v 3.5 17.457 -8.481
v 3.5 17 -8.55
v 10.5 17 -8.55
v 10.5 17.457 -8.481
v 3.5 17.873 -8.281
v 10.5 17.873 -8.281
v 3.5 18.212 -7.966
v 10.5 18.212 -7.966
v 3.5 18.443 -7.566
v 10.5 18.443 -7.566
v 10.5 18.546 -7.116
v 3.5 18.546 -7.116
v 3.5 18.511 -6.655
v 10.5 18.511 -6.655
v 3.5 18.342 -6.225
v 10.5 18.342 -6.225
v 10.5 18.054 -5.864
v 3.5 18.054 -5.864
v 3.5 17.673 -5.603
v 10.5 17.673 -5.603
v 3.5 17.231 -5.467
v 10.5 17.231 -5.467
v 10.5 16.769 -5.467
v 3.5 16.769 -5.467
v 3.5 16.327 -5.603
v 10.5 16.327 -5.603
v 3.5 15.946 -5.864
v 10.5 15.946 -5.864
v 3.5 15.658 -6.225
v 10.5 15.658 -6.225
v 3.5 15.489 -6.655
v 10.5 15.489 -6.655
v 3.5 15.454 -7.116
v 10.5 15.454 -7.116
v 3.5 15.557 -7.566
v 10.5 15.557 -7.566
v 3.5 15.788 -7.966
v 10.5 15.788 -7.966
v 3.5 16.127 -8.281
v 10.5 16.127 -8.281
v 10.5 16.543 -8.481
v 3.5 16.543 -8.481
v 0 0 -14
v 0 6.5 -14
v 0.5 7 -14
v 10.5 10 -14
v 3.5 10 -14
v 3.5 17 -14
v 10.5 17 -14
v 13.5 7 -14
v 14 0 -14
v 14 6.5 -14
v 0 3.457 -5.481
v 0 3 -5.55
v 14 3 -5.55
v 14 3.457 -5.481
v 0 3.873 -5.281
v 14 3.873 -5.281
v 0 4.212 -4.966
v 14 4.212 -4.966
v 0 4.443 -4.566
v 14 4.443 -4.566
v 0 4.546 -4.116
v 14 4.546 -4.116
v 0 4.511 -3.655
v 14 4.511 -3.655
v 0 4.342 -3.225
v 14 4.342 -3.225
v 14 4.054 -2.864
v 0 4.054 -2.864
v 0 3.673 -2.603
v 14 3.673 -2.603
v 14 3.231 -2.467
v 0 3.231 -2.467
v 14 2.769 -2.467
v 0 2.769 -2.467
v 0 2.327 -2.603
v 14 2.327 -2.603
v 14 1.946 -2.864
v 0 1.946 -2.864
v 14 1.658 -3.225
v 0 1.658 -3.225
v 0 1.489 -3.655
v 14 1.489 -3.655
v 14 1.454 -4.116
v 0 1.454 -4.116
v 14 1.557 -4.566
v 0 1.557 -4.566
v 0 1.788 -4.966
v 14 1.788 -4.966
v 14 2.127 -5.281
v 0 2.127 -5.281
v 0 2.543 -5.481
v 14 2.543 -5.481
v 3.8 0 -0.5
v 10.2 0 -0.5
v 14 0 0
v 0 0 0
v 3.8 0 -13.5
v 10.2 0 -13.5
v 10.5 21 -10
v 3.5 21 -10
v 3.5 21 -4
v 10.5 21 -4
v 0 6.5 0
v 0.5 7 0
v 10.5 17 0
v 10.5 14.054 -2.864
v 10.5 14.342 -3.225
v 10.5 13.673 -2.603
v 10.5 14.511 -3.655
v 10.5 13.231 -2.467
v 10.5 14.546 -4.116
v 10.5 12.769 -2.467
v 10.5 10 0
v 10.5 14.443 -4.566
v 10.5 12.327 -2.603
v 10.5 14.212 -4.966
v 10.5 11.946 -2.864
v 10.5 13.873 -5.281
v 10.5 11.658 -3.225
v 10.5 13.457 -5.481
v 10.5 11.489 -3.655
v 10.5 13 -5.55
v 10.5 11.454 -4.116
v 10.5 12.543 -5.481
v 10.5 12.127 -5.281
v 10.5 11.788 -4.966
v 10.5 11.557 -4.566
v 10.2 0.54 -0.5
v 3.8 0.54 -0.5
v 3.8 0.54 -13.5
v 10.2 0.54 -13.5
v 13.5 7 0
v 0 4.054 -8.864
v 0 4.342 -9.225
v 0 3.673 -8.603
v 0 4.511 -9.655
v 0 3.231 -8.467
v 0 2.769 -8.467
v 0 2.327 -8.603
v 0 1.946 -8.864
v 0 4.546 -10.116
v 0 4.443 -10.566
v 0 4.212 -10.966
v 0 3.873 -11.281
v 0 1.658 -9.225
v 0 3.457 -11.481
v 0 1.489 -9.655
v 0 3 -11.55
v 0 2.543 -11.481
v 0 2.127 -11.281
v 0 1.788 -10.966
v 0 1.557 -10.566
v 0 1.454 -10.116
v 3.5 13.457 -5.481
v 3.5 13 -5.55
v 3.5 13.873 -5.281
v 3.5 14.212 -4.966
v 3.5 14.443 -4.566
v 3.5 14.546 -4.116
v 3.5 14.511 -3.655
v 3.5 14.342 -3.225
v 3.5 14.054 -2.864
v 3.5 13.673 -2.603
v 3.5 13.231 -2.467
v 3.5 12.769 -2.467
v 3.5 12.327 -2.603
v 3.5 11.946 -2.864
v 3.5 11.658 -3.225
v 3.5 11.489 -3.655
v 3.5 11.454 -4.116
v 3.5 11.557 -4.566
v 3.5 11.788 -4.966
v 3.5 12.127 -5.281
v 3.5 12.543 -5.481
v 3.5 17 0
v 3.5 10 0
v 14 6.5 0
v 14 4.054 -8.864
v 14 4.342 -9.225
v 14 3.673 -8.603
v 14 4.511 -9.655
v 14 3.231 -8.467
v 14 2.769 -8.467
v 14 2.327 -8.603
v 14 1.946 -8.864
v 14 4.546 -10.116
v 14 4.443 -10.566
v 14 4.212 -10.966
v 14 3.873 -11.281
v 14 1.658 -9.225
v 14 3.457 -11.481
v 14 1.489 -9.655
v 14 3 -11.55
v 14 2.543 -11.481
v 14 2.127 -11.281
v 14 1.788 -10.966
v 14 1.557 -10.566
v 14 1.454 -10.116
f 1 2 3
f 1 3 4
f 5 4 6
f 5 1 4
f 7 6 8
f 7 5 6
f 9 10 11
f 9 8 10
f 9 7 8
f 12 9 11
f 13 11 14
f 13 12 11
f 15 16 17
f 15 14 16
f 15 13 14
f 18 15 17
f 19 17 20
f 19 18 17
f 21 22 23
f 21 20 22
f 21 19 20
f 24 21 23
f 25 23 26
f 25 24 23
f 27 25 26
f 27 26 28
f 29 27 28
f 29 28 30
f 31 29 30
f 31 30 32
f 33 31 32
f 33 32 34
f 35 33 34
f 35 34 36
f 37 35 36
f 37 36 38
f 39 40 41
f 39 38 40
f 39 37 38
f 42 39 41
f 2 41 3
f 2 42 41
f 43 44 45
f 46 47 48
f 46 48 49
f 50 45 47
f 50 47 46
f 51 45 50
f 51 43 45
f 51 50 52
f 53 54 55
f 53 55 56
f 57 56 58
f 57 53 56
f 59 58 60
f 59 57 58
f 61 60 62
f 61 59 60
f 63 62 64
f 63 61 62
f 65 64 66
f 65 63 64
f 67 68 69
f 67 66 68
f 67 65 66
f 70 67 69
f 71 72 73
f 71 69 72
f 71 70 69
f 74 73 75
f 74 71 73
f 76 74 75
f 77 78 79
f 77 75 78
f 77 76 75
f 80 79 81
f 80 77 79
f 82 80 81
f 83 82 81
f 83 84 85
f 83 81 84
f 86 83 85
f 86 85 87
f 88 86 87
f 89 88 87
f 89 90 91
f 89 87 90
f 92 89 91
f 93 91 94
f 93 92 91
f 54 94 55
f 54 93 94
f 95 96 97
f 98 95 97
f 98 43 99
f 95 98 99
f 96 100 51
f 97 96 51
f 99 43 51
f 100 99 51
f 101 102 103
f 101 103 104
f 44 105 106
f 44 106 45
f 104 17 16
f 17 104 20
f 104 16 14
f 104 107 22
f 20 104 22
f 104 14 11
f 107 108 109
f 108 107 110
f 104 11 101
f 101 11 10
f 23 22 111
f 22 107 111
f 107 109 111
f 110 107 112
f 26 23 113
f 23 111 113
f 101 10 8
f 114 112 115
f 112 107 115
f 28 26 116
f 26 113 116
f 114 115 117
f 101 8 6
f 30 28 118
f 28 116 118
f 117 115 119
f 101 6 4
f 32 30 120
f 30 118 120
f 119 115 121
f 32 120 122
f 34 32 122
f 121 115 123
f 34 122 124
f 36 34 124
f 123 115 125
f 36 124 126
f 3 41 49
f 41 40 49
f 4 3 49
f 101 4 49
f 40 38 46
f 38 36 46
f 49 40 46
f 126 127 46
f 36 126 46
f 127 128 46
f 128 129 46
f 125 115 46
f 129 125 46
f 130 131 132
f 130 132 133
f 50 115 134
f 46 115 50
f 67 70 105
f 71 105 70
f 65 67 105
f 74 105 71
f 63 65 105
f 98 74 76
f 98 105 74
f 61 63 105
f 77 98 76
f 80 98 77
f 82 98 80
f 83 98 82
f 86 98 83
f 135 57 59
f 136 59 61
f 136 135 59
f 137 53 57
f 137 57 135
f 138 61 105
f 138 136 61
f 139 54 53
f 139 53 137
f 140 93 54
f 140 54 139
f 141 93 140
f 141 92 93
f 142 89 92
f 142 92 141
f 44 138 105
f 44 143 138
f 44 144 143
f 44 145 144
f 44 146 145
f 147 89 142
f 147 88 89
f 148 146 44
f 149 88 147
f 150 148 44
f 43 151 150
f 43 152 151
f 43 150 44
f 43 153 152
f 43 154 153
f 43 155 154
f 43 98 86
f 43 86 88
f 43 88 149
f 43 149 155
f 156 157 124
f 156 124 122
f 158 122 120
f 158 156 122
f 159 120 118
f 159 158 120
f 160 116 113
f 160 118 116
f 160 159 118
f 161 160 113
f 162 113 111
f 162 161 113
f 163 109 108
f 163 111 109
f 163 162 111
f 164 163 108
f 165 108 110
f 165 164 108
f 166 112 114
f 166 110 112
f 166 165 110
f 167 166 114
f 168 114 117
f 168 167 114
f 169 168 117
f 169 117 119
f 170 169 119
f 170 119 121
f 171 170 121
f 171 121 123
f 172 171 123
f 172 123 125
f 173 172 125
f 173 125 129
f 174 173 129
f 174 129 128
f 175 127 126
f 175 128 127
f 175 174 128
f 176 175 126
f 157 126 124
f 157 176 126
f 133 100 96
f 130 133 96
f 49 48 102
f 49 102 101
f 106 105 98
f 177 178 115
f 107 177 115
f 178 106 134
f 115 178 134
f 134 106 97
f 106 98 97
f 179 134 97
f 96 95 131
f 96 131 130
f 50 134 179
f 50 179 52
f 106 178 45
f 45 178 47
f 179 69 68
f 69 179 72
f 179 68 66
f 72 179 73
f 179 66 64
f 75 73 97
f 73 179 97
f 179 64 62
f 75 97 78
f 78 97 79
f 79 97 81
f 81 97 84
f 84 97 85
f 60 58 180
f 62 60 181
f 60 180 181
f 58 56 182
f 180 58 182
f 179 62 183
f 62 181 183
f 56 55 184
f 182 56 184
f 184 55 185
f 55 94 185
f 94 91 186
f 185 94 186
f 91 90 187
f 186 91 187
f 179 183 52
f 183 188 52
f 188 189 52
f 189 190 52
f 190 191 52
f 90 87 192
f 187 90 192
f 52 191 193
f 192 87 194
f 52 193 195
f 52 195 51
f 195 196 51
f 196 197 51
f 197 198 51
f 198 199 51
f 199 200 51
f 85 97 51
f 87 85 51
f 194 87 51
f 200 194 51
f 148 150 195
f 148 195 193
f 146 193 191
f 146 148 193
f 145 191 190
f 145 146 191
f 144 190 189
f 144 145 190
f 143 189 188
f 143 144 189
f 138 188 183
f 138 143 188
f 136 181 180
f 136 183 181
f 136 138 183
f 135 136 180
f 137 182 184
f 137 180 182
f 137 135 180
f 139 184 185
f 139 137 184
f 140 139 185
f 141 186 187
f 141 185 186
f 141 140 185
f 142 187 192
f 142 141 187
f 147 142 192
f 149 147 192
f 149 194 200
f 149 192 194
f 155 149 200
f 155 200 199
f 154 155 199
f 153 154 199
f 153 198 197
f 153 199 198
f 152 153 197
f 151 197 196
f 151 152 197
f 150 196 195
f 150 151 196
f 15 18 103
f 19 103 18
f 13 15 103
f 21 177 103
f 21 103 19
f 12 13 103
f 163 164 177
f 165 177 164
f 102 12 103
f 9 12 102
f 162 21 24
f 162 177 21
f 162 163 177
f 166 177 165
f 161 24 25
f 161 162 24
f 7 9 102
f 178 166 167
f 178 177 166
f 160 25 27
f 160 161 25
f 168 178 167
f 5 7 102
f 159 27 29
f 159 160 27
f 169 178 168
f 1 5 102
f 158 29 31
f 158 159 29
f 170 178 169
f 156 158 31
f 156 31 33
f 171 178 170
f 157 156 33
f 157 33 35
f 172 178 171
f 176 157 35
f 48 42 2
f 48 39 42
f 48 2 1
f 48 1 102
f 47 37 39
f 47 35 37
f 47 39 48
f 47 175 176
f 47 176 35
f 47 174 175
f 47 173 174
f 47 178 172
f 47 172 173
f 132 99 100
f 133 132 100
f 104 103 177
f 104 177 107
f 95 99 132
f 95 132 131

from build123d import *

# Parameters (mm, degrees)
SKETCH1_W               = 14
SKETCH1_H               = 14
BOSS_EXTRUDE1_DEPTH     = 7
SKETCH2_W               = 7
SKETCH2_H               = 14
BOSS_EXTRUDE2_DEPTH     = 14
CHAMFER1_SIZE           = 3
CHAMFER2_SIZE           = 0.5
CHAMFER3_SIZE           = 4
CUT_EXTRUDE1_DEPTH      = 28.335873866
CUT_EXTRUDE1_DEPTH_BACK = 28.335873866
SKETCH3_R               = 1.55
SKETCH5_W               = 6.4
SKETCH5_H               = 13
CUT_EXTRUDE2_DEPTH      = 0.54


with BuildPart() as part:
    # Sketch1 → Boss-Extrude1 (new body)
    with BuildSketch(Plane(origin=(0, 0, 0), x_dir=(1, 0, 0), z_dir=(0, 1, 0))):
        with Locations((7, 7)):
            Rectangle(SKETCH1_W, SKETCH1_H)
    extrude(amount=BOSS_EXTRUDE1_DEPTH)

    # Sketch2 → Boss-Extrude2 (add)
    with BuildSketch(Plane(origin=(0, 7, 0), x_dir=(1, 0, 0), z_dir=(0, 1, 0))):
        with Locations((7, 7)):
            Rectangle(SKETCH2_W, SKETCH2_H)
    extrude(amount=BOSS_EXTRUDE2_DEPTH)

    # Chamfer1
    chamfer1_edges = [part.edges().sort_by_distance(p)[0] for p in [
        (3.5, 7, -7),
        (10.5, 7, -7),
    ]]
    chamfer(chamfer1_edges, length=CHAMFER1_SIZE)

    # Chamfer2
    chamfer2_edges = [part.edges().sort_by_distance(p)[0] for p in [
        (0, 7, -7),
        (14, 7, -7),
    ]]
    chamfer(chamfer2_edges, length=CHAMFER2_SIZE - 0.0001)  # a hair under: the kernel refuses the full size

    # Chamfer3
    chamfer3_edges = [part.edges().sort_by_distance(p)[0] for p in [
        (7, 21, 0),
        (7, 21, -14),
    ]]
    chamfer(chamfer3_edges, length=CHAMFER3_SIZE)

    # Sketch3 → Cut-Extrude1 (cut, two sides: drawn at the far end of the back side and taken through both)
    with BuildSketch(Plane(origin=(10.5, 0, 0), x_dir=(0, 0, -1), z_dir=(1, 0, 0)).offset(-CUT_EXTRUDE1_DEPTH_BACK)):
        with Locations((7, 17)):
            Circle(SKETCH3_R)
        with Locations((4, 13)):
            Circle(SKETCH3_R)
        with Locations((4, 3)):
            Circle(SKETCH3_R)
        with Locations((10, 3)):
            Circle(SKETCH3_R)
    extrude(amount=CUT_EXTRUDE1_DEPTH + CUT_EXTRUDE1_DEPTH_BACK, mode=Mode.SUBTRACT)

    # Sketch5 → Cut-Extrude2 (cut)
    with BuildSketch(Plane.XZ):
        with Locations((7, -7)):
            Rectangle(SKETCH5_W, SKETCH5_H)
    extrude(amount=-CUT_EXTRUDE2_DEPTH, mode=Mode.SUBTRACT)


solid = part.part
